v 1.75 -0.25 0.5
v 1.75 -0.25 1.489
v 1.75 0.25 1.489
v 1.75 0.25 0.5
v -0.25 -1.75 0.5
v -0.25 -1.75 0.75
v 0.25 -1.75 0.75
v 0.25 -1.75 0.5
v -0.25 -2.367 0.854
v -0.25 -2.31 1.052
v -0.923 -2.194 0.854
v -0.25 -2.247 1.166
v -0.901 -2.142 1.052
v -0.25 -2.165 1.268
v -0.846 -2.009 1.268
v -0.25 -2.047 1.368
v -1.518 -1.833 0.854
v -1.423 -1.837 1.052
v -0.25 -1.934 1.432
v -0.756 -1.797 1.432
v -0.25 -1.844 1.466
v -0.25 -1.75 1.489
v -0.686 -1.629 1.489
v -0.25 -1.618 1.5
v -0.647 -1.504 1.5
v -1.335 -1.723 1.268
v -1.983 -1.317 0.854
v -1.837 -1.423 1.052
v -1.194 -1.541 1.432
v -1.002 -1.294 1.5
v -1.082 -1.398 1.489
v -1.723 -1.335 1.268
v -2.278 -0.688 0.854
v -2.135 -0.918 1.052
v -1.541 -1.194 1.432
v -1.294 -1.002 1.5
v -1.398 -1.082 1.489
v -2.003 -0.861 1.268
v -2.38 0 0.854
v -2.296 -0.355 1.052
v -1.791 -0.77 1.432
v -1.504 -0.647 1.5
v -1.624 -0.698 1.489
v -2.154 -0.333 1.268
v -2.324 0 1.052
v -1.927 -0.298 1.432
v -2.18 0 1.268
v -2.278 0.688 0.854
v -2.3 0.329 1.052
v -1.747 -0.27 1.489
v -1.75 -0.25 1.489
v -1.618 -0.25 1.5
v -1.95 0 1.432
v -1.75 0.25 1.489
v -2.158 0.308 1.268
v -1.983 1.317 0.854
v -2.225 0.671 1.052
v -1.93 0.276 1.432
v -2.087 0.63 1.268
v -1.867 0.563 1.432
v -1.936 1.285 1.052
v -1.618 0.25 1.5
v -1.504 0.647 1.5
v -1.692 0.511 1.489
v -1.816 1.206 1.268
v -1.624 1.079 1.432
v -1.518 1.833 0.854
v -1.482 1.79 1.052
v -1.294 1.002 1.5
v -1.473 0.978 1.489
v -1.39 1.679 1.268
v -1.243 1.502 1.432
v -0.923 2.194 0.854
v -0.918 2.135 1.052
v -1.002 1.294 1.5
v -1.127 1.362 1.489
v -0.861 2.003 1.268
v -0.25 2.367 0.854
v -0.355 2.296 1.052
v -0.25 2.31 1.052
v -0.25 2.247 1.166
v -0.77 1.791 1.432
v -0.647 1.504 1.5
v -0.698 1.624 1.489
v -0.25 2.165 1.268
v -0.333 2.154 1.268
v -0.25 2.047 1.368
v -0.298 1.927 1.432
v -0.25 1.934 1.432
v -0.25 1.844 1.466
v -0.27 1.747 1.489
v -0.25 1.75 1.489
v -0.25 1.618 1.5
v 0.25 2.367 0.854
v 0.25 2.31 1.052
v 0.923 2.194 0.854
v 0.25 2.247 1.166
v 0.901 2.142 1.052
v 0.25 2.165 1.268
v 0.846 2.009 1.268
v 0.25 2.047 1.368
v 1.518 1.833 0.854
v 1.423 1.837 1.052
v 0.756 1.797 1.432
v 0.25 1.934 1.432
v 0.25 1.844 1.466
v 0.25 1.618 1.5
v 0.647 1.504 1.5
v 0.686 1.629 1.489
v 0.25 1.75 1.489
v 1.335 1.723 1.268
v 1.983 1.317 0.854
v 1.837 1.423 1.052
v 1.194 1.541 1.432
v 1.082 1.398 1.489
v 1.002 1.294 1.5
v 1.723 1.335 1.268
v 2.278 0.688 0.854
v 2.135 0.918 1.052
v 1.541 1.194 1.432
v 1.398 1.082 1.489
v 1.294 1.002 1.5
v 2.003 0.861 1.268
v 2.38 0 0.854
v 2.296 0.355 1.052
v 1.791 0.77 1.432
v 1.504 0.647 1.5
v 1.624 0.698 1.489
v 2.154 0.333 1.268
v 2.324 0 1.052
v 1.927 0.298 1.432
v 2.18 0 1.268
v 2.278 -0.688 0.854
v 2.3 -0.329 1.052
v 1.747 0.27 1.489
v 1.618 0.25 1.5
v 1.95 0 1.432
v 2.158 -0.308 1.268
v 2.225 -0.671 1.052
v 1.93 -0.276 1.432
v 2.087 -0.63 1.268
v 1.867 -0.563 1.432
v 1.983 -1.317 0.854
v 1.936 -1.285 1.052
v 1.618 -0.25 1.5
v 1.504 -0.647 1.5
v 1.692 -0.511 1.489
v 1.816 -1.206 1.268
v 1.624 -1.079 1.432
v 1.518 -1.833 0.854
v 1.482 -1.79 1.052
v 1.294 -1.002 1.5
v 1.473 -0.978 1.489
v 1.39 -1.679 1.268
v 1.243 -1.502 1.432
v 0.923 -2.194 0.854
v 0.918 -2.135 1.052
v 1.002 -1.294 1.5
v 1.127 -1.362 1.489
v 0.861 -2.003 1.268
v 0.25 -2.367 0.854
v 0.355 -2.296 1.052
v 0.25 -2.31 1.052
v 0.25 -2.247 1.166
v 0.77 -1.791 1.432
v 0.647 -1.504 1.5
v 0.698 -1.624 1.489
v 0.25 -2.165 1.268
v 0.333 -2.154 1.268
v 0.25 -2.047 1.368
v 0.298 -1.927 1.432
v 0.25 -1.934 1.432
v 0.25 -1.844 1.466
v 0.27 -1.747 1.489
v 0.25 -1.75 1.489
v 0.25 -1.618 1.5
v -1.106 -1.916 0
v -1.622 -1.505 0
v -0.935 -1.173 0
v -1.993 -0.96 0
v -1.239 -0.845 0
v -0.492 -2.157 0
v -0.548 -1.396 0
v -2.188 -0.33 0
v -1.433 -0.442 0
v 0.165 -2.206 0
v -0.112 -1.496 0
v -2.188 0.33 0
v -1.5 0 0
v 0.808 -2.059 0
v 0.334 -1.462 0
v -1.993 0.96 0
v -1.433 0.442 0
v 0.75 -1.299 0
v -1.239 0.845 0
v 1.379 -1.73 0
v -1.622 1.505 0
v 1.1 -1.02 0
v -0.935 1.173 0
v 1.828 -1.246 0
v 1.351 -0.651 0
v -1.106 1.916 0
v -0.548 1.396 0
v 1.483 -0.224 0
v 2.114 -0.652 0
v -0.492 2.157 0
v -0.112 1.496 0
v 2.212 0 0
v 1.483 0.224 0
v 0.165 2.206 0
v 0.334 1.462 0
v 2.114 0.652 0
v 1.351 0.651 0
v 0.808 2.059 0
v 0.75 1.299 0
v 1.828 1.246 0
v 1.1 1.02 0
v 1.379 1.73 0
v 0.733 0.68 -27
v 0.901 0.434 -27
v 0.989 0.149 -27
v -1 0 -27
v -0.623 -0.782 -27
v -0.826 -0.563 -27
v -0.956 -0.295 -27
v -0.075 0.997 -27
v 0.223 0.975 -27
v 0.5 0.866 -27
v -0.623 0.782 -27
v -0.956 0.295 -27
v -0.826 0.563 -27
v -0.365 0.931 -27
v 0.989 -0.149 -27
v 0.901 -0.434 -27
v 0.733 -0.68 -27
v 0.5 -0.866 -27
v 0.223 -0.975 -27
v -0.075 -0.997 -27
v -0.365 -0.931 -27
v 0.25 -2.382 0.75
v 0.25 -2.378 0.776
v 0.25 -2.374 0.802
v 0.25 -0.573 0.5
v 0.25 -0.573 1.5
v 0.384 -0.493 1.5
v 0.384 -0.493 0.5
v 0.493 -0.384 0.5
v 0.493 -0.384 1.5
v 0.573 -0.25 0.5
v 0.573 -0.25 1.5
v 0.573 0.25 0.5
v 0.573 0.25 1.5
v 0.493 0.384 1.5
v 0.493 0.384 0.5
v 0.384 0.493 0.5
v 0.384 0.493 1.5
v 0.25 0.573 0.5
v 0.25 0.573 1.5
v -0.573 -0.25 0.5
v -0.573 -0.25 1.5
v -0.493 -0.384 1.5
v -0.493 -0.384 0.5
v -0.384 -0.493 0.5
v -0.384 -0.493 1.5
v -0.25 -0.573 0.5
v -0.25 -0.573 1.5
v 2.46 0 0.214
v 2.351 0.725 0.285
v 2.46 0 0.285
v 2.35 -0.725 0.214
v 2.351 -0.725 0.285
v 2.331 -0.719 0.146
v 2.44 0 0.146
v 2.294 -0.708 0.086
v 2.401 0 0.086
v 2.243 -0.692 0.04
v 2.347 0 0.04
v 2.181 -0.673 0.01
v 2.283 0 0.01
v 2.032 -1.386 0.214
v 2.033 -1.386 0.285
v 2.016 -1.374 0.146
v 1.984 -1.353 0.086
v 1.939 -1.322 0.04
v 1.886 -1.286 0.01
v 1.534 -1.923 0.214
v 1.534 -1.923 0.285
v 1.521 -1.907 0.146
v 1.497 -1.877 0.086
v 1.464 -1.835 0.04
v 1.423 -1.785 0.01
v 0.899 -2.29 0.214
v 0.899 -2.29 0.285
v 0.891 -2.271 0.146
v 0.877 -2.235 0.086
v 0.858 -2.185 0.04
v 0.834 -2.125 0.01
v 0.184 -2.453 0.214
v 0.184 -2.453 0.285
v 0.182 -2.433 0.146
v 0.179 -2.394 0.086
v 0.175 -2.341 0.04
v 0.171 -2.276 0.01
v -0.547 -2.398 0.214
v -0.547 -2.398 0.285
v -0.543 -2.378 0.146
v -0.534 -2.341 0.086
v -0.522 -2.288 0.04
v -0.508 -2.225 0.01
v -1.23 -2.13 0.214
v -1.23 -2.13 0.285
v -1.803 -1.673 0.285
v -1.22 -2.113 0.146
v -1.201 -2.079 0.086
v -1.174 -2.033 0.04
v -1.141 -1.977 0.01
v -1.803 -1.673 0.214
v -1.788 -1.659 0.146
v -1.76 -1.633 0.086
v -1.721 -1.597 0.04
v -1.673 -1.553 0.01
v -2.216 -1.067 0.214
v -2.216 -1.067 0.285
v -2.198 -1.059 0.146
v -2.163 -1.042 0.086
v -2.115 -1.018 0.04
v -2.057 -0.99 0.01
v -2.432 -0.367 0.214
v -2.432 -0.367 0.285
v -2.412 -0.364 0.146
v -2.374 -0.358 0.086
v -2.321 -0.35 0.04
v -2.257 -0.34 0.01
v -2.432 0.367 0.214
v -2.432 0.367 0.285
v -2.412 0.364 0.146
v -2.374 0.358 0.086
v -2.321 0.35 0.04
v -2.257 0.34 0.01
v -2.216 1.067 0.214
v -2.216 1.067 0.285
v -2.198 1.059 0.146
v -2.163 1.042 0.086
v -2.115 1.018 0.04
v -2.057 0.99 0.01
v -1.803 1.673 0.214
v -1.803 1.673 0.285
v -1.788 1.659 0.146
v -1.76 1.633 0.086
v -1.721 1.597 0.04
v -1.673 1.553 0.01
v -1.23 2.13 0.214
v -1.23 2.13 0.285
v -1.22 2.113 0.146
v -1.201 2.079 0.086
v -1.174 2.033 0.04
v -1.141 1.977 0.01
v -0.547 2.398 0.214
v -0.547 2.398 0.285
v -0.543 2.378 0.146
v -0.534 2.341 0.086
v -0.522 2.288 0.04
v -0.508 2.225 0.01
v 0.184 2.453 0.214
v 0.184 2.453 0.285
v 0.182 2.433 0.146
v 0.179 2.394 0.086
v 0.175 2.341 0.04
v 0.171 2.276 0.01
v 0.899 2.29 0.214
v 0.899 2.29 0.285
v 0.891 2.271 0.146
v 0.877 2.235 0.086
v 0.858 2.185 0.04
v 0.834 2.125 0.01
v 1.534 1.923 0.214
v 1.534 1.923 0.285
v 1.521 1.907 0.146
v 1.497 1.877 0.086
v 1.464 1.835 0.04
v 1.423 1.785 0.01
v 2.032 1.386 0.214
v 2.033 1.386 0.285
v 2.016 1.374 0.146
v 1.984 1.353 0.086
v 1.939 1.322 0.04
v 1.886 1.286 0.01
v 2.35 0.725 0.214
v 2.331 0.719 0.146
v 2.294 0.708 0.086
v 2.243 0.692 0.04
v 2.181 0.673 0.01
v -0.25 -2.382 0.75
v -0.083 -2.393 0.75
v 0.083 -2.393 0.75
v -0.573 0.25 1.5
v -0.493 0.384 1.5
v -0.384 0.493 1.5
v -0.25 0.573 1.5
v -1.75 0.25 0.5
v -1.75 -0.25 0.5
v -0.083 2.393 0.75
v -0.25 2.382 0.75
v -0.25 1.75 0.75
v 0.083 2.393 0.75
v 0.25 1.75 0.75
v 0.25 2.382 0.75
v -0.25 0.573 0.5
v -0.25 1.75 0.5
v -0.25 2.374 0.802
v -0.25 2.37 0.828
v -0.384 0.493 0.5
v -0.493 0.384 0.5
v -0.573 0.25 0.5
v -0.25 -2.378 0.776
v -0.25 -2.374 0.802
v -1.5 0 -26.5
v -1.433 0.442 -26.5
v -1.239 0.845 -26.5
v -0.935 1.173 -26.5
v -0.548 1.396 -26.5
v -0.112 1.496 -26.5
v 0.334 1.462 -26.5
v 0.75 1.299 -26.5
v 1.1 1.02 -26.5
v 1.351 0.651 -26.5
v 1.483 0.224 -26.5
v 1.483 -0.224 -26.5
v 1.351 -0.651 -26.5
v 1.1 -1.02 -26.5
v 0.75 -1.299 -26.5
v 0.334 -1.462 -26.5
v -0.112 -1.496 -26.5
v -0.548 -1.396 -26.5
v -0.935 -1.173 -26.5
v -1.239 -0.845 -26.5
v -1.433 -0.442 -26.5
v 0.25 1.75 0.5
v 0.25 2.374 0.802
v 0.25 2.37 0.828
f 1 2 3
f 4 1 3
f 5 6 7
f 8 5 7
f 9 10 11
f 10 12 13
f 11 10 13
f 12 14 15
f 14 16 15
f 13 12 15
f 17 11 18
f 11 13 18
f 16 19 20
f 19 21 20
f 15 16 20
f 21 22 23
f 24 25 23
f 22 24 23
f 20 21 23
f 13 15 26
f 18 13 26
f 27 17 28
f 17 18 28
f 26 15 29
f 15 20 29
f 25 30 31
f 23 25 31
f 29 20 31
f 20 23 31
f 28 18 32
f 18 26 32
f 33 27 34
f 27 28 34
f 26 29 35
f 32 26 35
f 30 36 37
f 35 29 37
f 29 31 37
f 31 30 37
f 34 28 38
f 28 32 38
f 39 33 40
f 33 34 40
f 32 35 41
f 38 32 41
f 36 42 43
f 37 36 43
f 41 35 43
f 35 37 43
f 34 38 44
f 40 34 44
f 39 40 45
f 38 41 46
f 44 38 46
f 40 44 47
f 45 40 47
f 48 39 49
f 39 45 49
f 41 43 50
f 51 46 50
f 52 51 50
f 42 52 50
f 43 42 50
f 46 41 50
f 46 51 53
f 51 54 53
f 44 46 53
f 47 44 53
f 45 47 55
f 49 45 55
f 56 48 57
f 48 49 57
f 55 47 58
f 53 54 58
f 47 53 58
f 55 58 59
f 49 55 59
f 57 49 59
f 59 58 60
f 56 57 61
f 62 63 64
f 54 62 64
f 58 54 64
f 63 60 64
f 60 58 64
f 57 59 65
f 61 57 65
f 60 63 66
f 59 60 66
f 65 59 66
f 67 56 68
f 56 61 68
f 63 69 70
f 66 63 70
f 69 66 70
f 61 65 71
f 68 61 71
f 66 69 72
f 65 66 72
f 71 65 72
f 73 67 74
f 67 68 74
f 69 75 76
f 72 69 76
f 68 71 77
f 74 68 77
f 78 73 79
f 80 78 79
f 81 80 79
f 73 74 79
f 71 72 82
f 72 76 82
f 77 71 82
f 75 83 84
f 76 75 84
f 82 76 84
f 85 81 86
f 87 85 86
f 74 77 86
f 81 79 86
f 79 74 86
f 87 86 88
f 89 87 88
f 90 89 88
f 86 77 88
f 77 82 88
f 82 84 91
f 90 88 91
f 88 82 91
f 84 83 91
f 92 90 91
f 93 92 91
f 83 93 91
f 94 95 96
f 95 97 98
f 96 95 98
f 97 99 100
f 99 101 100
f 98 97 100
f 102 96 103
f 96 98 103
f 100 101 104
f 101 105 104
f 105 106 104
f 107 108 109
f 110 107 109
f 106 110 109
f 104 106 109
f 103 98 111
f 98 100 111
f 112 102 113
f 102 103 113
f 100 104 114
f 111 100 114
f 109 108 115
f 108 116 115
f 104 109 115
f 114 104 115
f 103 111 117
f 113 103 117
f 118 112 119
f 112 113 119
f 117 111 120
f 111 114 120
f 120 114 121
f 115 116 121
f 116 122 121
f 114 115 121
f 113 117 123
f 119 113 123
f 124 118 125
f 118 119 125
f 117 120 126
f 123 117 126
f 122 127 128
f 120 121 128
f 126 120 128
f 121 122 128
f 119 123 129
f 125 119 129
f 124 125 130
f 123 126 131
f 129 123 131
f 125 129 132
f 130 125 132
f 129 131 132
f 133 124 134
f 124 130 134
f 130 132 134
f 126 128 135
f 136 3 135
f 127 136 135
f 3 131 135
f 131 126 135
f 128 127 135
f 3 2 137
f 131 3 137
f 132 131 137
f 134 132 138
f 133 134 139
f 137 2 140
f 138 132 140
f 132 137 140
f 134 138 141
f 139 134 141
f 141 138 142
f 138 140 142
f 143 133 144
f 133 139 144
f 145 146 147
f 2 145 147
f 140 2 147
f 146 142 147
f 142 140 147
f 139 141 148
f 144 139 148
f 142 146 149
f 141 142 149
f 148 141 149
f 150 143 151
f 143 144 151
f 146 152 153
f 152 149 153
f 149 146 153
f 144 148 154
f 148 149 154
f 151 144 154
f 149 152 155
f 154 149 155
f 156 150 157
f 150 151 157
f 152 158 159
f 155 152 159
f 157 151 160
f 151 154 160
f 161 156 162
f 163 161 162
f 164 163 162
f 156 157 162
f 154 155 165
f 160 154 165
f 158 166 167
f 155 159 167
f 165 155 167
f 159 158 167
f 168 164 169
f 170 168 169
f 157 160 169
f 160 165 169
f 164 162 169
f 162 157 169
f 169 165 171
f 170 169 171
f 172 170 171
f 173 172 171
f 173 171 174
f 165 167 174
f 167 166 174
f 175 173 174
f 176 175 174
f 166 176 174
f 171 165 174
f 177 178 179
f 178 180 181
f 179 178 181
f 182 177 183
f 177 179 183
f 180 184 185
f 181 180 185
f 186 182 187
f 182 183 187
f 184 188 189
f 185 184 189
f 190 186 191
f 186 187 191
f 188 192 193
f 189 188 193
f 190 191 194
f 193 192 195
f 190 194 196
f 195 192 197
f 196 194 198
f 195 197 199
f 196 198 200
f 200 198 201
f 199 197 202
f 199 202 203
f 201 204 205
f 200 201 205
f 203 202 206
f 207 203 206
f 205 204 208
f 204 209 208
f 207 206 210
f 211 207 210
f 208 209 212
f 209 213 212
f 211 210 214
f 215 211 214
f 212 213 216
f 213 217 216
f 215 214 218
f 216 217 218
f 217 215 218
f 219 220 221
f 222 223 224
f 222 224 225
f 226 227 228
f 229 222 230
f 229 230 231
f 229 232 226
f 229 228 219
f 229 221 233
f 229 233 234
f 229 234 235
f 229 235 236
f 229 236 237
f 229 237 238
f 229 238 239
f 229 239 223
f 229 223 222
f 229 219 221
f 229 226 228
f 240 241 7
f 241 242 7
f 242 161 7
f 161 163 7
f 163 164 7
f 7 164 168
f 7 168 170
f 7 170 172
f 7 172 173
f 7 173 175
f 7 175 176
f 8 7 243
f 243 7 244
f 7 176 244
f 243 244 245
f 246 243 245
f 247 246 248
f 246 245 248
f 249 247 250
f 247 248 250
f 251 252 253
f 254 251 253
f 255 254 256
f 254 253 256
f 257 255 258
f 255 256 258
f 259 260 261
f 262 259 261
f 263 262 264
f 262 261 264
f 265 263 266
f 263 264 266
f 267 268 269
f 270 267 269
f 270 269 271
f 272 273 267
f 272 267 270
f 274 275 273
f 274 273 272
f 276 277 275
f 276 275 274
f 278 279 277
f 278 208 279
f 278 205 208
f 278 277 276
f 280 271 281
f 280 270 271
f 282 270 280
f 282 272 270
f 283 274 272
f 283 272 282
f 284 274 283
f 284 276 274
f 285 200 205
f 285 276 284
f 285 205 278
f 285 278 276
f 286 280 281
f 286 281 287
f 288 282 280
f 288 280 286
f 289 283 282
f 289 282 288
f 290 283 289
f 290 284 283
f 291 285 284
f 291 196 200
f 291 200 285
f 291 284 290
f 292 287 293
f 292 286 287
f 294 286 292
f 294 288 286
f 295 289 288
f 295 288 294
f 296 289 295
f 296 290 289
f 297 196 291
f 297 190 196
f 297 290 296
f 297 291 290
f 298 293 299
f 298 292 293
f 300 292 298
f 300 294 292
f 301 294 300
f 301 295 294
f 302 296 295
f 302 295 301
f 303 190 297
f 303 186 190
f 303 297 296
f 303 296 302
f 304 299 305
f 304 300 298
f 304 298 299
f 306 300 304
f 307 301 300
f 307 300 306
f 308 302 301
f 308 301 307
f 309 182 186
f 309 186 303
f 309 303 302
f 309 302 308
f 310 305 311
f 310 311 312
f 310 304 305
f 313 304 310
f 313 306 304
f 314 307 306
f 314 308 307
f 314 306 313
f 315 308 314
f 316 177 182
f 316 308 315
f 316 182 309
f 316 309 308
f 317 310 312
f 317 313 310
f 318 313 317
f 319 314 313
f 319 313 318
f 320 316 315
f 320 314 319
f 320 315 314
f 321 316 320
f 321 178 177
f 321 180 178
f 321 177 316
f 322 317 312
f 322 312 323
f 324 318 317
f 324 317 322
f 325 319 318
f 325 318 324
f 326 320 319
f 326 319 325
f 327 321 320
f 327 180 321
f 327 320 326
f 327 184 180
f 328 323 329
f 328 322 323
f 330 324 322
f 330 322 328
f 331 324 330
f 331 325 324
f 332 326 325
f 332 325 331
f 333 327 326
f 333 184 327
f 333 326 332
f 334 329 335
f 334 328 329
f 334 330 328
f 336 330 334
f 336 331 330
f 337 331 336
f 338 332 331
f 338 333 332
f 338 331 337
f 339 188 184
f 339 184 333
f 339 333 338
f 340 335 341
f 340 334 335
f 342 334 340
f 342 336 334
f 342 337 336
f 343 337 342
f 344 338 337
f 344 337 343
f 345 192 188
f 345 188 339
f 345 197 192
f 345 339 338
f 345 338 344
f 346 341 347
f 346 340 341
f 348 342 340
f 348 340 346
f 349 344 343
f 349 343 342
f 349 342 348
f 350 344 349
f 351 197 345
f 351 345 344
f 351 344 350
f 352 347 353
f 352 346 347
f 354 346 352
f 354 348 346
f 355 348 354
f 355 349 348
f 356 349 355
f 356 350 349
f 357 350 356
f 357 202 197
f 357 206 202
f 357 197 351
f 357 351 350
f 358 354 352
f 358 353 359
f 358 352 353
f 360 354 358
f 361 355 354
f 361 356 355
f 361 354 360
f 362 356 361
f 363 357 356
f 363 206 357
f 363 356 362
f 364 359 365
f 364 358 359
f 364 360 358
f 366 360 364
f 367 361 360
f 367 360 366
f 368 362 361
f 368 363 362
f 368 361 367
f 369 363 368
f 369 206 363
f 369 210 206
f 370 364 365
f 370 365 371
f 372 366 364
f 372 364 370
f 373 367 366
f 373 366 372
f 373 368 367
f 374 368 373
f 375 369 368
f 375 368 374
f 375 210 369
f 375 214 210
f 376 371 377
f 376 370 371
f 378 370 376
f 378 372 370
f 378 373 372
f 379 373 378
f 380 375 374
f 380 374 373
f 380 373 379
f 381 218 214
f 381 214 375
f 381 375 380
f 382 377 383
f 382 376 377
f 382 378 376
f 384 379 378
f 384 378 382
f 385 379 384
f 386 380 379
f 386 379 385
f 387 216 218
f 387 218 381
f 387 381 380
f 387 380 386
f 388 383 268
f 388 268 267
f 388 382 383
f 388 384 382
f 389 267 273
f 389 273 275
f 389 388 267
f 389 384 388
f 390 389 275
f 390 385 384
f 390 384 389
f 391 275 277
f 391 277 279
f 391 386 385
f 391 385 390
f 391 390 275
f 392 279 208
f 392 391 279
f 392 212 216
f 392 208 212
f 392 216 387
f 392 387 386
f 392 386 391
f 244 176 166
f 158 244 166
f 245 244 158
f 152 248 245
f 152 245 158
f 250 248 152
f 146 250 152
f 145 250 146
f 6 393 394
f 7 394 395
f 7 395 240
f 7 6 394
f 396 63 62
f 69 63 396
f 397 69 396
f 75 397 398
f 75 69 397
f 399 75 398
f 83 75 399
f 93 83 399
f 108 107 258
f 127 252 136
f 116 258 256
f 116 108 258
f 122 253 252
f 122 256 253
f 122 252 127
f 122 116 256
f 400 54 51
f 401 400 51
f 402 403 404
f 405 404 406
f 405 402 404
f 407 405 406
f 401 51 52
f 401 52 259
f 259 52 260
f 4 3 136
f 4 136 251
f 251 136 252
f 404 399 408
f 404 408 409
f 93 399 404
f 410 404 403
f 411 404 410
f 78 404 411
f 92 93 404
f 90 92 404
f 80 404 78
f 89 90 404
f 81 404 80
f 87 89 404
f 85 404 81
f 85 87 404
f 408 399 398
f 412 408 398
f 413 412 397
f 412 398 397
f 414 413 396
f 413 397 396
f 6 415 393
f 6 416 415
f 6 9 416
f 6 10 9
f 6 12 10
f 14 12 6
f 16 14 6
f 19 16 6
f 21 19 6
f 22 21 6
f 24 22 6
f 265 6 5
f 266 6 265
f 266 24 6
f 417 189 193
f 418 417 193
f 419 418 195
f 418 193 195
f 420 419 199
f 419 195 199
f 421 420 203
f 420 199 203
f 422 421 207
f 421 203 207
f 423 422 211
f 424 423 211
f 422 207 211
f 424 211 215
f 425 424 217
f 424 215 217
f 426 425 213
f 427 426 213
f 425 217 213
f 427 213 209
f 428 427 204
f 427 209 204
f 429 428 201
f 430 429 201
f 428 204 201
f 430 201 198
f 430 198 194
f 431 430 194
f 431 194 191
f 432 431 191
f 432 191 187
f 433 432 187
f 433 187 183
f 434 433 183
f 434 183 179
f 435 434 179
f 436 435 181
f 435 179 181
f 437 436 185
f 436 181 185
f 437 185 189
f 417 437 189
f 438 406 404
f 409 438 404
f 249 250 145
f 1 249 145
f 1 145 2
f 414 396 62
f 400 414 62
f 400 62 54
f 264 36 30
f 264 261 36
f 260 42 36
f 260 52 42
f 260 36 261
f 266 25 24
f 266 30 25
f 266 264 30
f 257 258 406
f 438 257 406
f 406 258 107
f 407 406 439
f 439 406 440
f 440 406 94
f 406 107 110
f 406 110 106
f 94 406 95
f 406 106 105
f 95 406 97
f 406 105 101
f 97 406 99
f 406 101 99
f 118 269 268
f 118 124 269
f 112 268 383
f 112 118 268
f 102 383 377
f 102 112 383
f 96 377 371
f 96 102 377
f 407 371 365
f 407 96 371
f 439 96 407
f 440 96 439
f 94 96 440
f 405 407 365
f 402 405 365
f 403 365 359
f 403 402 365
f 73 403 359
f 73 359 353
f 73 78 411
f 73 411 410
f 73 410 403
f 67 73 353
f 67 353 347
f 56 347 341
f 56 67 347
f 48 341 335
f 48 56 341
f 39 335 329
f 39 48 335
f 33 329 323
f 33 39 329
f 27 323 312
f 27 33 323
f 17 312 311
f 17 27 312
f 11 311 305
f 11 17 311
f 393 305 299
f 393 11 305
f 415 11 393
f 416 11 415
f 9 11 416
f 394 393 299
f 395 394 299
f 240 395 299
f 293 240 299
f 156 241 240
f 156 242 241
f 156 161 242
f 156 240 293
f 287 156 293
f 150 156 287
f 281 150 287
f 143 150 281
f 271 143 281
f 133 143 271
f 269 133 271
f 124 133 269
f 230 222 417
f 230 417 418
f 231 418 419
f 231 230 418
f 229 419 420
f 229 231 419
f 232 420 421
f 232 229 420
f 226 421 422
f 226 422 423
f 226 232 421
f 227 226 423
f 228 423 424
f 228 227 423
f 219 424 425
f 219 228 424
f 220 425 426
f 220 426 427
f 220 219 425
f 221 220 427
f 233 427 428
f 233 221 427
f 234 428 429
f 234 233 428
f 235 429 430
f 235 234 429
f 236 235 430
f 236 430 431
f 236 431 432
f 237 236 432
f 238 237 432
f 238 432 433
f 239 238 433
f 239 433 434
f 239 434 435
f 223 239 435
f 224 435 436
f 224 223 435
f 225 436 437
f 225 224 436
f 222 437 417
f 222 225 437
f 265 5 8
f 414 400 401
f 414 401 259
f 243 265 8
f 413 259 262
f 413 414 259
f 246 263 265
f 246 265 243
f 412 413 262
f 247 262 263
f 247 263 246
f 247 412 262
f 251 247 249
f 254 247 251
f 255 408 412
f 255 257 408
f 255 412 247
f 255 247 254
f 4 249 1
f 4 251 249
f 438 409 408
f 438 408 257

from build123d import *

# Parameters (mm, degrees)
ESQUISSE1_R             = 2.5
BASE_EXTRUSION_DEPTH    = 1.5
BASE_EXTRUSION_TAPER    = 8
CONG_1_R                = 0.75
CONG_2_R                = 0.25
ESQUISSE2_R             = 1.5
BOSS_EXTRU_1_DEPTH      = 27
CHANFREIN1_SIZE         = 0.5
ENL_V_MAT_EXTRU_1_DEPTH = 1
ESQUISSE5_W             = 0.5
ESQUISSE5_H             = 5.000243794
ENL_V_MAT_EXTRU_2_DEPTH = 0.75


with BuildPart() as part:
    # Esquisse1 → Base-Extrusion (new body)
    with BuildSketch(Plane.XY):
        Circle(ESQUISSE1_R)
    extrude(amount=BASE_EXTRUSION_DEPTH, taper=BASE_EXTRUSION_TAPER)

    # Congé1
    cong_1_edges = [part.edges().sort_by_distance(p)[0] for p in [
        (-2.289188748, 0, 1.5),
    ]]
    fillet(cong_1_edges, radius=CONG_1_R)

    # Congé2
    cong_2_edges = [part.edges().sort_by_distance(p)[0] for p in [
        (-2.5, 0, 0),
    ]]
    fillet(cong_2_edges, radius=CONG_2_R)

    # Esquisse2 → Boss.-Extru.1 (add)
    with BuildSketch(Plane(origin=(0, 0, 0), x_dir=(-1, 0, 0), z_dir=(0, 0, -1))):
        Circle(ESQUISSE2_R)
    extrude(amount=BOSS_EXTRU_1_DEPTH)

    # Chanfrein1
    chanfrein1_edges = [part.edges().sort_by_distance(p)[0] for p in [
        (1.5, 0, -27),
    ]]
    chamfer(chanfrein1_edges, length=CHANFREIN1_SIZE)

    # Esquisse4 → Enlèv. mat.-Extru.1 (cut)
    with BuildSketch(Plane.XY.offset(1.5)):
        with BuildLine():
            Line((-0.25, 1.75), (-0.25, 0.572821962))
            ThreePointArc((-0.25, 0.572821962), (-0.441941738, 0.441941738), (-0.572821962, 0.25))
            Line((-0.572821962, 0.25), (-1.75, 0.25))
            Line((-1.75, 0.25), (-1.75, -0.25))
            Line((-1.75, -0.25), (-0.572821962, -0.25))
            ThreePointArc((-0.572821962, -0.25), (-0.441941738, -0.441941738), (-0.25, -0.572821962))
            Line((-0.25, -0.572821962), (-0.25, -1.75))
            Line((-0.25, -1.75), (0.25, -1.75))
            Line((0.25, -1.75), (0.25, -0.572821962))
            ThreePointArc((0.25, -0.572821962), (0.441941738, -0.441941738), (0.572821962, -0.25))
            Line((0.572821962, -0.25), (1.75, -0.25))
            Line((1.75, -0.25), (1.75, 0.25))
            Line((1.75, 0.25), (0.572821962, 0.25))
            ThreePointArc((0.572821962, 0.25), (0.441941738, 0.441941738), (0.25, 0.572821962))
            Line((0.25, 0.572821962), (0.25, 1.75))
            Line((0.25, 1.75), (-0.25, 1.75))
        make_face()
    extrude(amount=-ENL_V_MAT_EXTRU_1_DEPTH, mode=Mode.SUBTRACT)

    # Esquisse5 → Enlèv. mat.-Extru.2 (cut)
    with BuildSketch(Plane.XY.offset(1.5)):
        with Locations((0, 0.01124212)):
            Rectangle(ESQUISSE5_W, ESQUISSE5_H)
    extrude(amount=-ENL_V_MAT_EXTRU_2_DEPTH, mode=Mode.SUBTRACT)


solid = part.part
